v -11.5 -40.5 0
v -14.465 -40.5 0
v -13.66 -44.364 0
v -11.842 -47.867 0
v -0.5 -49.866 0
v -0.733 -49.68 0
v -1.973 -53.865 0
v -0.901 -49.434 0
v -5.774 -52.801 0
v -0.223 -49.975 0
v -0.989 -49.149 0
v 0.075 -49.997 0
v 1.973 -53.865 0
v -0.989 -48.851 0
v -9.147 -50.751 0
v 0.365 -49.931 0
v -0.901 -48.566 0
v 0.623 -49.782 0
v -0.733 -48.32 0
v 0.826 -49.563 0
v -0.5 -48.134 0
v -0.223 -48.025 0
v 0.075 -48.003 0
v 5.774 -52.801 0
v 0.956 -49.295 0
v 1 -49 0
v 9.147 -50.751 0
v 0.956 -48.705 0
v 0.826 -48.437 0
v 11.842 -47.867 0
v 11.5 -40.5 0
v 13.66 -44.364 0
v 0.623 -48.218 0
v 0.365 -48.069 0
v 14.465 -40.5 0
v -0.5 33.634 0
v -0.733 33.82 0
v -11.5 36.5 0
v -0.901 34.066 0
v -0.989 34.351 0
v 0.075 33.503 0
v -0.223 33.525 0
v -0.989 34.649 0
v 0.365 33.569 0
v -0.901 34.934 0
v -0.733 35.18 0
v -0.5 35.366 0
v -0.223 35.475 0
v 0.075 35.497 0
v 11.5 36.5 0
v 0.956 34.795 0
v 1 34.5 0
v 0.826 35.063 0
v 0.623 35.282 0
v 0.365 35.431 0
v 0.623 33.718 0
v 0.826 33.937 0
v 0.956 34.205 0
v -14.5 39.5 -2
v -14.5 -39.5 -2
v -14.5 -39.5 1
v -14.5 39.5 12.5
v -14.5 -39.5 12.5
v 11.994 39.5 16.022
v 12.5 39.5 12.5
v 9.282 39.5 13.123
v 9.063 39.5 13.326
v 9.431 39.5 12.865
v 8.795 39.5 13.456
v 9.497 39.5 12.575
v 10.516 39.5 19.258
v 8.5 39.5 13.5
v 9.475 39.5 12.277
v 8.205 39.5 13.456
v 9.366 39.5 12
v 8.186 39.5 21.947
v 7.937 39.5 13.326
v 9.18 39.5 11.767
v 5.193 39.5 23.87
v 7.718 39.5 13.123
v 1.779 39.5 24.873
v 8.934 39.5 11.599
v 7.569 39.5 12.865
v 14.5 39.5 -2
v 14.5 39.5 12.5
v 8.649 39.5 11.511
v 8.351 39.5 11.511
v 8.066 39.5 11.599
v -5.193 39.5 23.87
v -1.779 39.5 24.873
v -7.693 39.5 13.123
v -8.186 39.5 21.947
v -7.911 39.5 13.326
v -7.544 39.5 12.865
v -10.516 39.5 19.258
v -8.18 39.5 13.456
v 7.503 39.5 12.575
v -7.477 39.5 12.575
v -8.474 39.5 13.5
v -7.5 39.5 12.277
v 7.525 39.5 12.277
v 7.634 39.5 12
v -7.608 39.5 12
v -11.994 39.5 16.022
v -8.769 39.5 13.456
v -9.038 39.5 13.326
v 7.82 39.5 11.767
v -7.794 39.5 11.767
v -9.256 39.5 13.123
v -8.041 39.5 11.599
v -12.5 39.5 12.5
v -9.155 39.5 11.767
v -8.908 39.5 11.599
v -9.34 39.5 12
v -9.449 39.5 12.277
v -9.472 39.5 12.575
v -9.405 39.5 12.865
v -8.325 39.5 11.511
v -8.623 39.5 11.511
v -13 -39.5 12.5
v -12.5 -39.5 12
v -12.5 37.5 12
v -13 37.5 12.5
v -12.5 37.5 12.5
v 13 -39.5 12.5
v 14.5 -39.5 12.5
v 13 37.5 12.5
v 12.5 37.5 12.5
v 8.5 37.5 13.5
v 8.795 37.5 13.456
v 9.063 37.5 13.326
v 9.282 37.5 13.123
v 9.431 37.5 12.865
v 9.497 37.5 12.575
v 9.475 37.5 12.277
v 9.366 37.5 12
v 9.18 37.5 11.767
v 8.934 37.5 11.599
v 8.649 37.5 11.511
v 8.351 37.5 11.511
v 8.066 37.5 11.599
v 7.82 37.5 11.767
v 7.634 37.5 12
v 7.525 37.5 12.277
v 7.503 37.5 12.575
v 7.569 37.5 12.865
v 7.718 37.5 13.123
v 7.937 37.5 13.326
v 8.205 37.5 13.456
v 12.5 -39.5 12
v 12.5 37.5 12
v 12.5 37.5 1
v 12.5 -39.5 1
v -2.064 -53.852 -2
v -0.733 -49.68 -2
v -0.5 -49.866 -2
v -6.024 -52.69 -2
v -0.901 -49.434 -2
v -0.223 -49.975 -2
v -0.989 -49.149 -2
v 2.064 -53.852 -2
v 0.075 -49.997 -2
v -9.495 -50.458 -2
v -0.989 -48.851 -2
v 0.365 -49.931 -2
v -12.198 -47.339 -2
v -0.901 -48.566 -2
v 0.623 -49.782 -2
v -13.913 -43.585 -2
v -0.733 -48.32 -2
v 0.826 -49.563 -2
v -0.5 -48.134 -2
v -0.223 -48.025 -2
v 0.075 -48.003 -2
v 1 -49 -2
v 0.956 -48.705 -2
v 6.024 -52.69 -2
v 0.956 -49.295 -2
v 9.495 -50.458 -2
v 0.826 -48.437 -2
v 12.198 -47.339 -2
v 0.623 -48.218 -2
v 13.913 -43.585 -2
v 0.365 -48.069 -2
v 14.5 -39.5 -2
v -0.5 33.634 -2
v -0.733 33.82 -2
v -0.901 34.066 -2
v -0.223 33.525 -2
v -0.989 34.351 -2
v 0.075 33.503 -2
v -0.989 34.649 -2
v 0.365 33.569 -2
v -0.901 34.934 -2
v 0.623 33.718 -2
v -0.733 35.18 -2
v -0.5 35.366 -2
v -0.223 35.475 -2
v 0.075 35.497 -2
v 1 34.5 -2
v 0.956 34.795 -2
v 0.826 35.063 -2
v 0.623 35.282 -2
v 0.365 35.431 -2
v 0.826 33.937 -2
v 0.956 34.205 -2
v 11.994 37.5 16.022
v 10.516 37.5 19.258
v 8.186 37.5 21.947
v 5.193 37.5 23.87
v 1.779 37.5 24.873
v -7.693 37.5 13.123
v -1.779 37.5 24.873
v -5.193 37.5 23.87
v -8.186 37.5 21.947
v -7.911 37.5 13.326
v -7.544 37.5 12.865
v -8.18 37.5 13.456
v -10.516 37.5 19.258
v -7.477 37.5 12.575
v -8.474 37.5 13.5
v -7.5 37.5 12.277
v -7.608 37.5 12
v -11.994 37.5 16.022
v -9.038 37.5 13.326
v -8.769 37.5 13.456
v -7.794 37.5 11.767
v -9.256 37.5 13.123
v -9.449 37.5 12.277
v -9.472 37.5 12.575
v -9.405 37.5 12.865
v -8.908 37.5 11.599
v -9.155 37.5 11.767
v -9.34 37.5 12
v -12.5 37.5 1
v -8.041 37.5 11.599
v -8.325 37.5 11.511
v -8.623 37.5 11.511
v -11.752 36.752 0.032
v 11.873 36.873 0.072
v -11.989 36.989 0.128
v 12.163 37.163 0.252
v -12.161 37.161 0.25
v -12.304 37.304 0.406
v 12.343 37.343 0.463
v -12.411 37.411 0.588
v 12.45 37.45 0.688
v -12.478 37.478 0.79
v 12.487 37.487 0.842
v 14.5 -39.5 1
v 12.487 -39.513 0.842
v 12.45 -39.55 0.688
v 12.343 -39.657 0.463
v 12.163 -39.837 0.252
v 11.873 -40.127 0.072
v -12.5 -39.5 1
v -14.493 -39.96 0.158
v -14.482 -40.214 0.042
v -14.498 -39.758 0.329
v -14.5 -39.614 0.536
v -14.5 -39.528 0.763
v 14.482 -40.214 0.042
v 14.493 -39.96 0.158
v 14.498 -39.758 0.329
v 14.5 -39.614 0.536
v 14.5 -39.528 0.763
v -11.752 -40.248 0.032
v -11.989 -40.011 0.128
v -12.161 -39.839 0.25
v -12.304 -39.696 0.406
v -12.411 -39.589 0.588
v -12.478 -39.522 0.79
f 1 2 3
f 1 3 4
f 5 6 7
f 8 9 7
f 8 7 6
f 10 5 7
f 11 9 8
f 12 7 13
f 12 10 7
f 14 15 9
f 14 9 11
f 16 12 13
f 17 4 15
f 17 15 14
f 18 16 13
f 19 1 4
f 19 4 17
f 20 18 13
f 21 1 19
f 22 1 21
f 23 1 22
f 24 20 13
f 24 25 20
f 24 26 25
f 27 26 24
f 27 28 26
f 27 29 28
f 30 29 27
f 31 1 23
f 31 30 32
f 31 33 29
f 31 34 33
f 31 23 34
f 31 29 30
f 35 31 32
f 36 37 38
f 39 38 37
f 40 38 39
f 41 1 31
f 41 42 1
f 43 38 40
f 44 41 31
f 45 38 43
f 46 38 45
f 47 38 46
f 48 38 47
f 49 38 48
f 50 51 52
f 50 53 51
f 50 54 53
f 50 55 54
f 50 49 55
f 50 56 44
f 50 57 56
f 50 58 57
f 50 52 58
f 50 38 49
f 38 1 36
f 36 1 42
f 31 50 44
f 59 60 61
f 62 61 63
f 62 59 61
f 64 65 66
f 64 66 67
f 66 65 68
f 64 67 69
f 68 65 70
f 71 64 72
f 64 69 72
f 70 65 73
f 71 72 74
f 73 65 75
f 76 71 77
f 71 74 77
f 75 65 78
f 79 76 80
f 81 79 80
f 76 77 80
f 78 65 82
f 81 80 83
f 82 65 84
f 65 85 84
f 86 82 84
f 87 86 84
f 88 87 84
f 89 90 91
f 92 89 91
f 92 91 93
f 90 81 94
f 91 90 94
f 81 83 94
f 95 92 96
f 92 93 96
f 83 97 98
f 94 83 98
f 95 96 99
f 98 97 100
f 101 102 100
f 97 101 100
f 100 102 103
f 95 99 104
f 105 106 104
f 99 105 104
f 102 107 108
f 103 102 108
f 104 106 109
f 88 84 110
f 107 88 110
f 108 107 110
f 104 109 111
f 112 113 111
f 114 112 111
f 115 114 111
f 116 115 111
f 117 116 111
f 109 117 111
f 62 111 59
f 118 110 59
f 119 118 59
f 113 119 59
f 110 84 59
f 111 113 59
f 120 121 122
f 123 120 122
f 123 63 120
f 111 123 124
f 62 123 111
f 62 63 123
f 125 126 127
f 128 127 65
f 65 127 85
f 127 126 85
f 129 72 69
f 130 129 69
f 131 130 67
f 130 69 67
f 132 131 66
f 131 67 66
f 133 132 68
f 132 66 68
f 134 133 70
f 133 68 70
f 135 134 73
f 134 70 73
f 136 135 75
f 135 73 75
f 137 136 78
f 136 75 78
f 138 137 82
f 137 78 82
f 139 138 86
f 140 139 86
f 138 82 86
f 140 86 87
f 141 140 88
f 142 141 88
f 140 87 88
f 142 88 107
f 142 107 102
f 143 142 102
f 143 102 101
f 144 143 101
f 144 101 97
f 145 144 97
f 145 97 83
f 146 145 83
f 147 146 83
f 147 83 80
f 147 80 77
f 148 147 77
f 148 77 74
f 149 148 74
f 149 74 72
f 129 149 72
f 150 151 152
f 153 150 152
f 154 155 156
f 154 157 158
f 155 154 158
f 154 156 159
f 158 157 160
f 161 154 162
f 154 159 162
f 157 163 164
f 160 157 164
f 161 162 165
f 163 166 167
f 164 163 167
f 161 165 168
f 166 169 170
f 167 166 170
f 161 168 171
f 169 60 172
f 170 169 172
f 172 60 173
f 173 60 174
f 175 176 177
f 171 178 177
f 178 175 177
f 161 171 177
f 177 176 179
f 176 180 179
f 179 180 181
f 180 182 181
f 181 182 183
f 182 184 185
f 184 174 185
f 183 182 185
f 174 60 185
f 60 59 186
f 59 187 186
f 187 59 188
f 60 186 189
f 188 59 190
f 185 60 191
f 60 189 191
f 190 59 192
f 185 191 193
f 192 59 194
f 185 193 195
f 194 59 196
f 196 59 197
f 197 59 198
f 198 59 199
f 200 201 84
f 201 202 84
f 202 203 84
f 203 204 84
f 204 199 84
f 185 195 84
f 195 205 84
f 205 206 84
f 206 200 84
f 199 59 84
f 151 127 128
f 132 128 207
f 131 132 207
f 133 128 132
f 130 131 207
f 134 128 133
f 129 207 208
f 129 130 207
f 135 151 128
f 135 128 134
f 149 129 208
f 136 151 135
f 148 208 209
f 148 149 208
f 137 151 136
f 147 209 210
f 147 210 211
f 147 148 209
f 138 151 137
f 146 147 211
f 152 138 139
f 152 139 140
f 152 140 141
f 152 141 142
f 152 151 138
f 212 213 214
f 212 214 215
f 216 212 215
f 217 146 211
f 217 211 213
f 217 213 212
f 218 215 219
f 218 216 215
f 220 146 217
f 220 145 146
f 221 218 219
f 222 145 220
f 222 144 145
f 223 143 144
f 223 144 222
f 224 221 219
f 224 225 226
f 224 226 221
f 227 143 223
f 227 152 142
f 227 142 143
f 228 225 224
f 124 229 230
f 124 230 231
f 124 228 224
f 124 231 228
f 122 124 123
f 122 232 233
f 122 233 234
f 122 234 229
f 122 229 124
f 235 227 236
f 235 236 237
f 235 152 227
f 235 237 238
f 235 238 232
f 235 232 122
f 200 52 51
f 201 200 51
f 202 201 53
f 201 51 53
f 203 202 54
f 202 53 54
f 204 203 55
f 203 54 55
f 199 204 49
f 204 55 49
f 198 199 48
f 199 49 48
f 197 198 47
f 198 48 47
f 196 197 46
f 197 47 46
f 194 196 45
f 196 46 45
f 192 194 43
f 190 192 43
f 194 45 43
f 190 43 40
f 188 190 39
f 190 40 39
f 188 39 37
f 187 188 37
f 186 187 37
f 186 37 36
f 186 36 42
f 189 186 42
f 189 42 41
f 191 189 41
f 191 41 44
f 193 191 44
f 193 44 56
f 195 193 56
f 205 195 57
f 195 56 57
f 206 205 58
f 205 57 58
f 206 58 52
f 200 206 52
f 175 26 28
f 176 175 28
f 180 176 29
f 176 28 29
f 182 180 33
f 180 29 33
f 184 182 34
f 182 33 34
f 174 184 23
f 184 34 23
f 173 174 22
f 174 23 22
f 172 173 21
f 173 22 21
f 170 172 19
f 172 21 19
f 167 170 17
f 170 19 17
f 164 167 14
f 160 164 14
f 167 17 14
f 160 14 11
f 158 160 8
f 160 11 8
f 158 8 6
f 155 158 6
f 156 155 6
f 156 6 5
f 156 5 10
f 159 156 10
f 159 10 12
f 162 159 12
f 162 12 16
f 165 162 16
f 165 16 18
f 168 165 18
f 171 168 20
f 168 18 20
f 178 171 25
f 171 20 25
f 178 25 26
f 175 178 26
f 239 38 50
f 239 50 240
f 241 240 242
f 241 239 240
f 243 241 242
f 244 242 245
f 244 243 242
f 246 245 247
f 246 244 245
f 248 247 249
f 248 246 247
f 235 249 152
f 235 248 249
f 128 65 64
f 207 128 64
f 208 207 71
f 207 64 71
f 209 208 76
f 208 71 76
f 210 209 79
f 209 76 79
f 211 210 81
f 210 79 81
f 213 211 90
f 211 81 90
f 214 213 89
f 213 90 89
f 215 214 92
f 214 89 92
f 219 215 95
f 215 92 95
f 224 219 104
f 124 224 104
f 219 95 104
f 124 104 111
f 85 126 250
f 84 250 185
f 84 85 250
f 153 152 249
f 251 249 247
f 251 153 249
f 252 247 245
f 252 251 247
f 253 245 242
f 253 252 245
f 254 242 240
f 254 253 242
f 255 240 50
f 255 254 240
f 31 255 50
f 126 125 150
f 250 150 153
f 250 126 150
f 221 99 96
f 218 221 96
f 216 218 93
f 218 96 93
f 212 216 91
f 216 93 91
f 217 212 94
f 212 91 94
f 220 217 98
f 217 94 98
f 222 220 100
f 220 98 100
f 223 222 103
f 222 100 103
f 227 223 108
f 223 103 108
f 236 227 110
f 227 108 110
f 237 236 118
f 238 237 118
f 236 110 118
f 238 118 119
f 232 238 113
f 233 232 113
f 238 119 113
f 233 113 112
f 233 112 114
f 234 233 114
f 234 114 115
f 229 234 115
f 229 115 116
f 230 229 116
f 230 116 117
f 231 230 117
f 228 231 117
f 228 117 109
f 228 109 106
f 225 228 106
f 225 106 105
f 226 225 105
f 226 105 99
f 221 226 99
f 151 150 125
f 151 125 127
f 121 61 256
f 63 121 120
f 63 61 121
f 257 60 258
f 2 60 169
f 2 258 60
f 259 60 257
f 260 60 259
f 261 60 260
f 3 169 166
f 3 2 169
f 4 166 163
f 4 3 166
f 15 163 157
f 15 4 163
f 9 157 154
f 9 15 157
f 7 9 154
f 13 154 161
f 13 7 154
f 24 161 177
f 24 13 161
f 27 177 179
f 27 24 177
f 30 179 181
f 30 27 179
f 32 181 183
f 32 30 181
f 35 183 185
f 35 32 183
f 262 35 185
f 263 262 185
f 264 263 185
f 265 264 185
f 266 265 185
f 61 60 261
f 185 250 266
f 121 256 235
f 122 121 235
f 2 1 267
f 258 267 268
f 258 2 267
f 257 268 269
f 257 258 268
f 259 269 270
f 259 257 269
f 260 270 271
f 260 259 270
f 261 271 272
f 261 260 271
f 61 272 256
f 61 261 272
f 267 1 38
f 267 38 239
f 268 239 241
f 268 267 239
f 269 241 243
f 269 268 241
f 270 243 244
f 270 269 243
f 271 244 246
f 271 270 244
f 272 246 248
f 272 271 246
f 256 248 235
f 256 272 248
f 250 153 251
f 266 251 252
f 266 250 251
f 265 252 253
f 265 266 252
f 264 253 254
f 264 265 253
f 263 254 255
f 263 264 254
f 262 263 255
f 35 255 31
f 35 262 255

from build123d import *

# Parameters (mm, degrees)
ESQUISSE1_R             = 1
BOSS_EXTRU_2_DEPTH      = 2
ESQUISSE4_W             = 12.5
ESQUISSE4_H             = 79
BOSS_EXTRU_3_DEPTH      = 2
ESQUISSE6_W             = 12.5
ESQUISSE6_H             = 79
BOSS_EXTRU_4_DEPTH      = 2
BOSS_EXTRU_7_DEPTH      = 2
ESQUISSE14_R            = 1
ENL_V_MAT_EXTRU_4_DEPTH = 98.864702523
CHANFREIN3_SIZE         = 0.5
CONG_1_R                = 1


with BuildPart() as part:
    # Esquisse1 → Boss.-Extru.2 (new body)
    with BuildSketch(Plane.XY):
        with BuildLine():
            Line((14.5, -39.5), (14.5, 39.5))
            Line((14.5, 39.5), (-14.5, 39.5))
            Line((-14.5, 39.5), (-14.5, -39.5))
            ThreePointArc((-14.5, -39.5), (0, -54), (14.5, -39.5))
        make_face()
        with Locations((0, 34.5)):
            Circle(ESQUISSE1_R, mode=Mode.SUBTRACT)
        with Locations((0, -49)):
            Circle(ESQUISSE1_R, mode=Mode.SUBTRACT)
    extrude(amount=-BOSS_EXTRU_2_DEPTH)

    # Esquisse4 → Boss.-Extru.3 (add)
    with BuildSketch(Plane.ZY.offset(14.5)):
        with Locations((6.25, 0)):
            Rectangle(ESQUISSE4_W, ESQUISSE4_H)
    extrude(amount=-BOSS_EXTRU_3_DEPTH)

    # Esquisse6 → Boss.-Extru.4 (add)
    with BuildSketch(Plane(origin=(14.5, 0, 0), x_dir=(0, 0, -1), z_dir=(1, 0, 0))):
        with Locations((-6.25, 0)):
            Rectangle(ESQUISSE6_W, ESQUISSE6_H)
    extrude(amount=-BOSS_EXTRU_4_DEPTH)

    # Esquisse11 → Boss.-Extru.7 (add)
    with BuildSketch(Plane(origin=(0, 39.5, 0), x_dir=(1, 0, 0), z_dir=(0, 1, 0))):
        with BuildLine():
            Line((-12.5, 0), (12.5, 0))
            Line((12.5, 0), (12.5, -12.5))
            ThreePointArc((12.5, -12.5), (0, -25), (-12.5, -12.5))
            Line((-12.5, -12.5), (-12.5, 0))
        make_face()
    extrude(amount=-BOSS_EXTRU_7_DEPTH)

    # Esquisse14 → Enlèv. mat.-Extru.4 (cut, through all)
    with BuildSketch(Plane(origin=(0, 39.5, 0), x_dir=(1, 0, 0), z_dir=(0, 1, 0))):
        with Locations(Location((-8.474453363, -12.5, 0), (0, 0, 270))):
            Circle(ESQUISSE14_R)
        with Locations(Location((8.5, -12.5, 0), (0, 0, 270))):
            Circle(ESQUISSE14_R)
    extrude(amount=-ENL_V_MAT_EXTRU_4_DEPTH, mode=Mode.SUBTRACT)

    # Chanfrein3
    chanfrein3_edges = [part.edges().sort_by_distance(p)[0] for p in [
        (-12.5, -1, 12.5),
        (12.5, -1, 12.5),
    ]]
    chamfer(chanfrein3_edges, length=CHANFREIN3_SIZE)

    # Congé1
    # the kernel refuses this fillet: 1 mm, written as the material it adds along each edge
    with BuildSketch(Plane(origin=(-14.5, -39.5, 0), x_dir=(0, -1, 0), z_dir=(1, 0, 0))) as cong_1_piece_1_section:
        with BuildLine():
            CenterArc((CONG_1_R, -CONG_1_R), CONG_1_R, 90, 90)
            Line((0, -CONG_1_R), (-CONG_1_R * 0.02, -CONG_1_R))
            Line((-CONG_1_R * 0.02, -CONG_1_R), (-CONG_1_R * 0.02, CONG_1_R * 0.02))
            Line((-CONG_1_R * 0.02, CONG_1_R * 0.02), (CONG_1_R, CONG_1_R * 0.02))
            Line((CONG_1_R, CONG_1_R * 0.02), (CONG_1_R, 0))
        make_face()
    cong_1_piece_1 = extrude(amount=2, mode=Mode.PRIVATE)
    cong_1_piece_1 = cong_1_piece_1 & Plane(origin=(0, -39.5, 0.22667443), x_dir=(-1, 0, 0), z_dir=(0, 0, 1)) * Cylinder(14.5, 8, mode=Mode.PRIVATE)
    add(cong_1_piece_1)
    with BuildSketch(Plane(origin=(12.5, -39.5, 0), x_dir=(0, 0, 1), z_dir=(0, 1, 0)), Plane(origin=(-12.5, -39.5, 0), x_dir=(1, 0, 0), z_dir=(0, 1, 0))) as cong_1_piece_2:
        with BuildLine():
            CenterArc((CONG_1_R, -CONG_1_R), CONG_1_R, 90, 90)
            Line((0, -CONG_1_R), (-CONG_1_R * 0.02, -CONG_1_R))
            Line((-CONG_1_R * 0.02, -CONG_1_R), (-CONG_1_R * 0.02, CONG_1_R * 0.02))
            Line((-CONG_1_R * 0.02, CONG_1_R * 0.02), (CONG_1_R, CONG_1_R * 0.02))
            Line((CONG_1_R, CONG_1_R * 0.02), (CONG_1_R, 0))
        make_face()
    extrude(amount=77)
    with BuildSketch(Plane(origin=(14.5, -39.5, 0), x_dir=(0, 0, 1), z_dir=(-1, 0, 0))) as cong_1_piece_3_section:
        with BuildLine():
            CenterArc((CONG_1_R, -CONG_1_R), CONG_1_R, 90, 90)
            Line((0, -CONG_1_R), (-CONG_1_R * 0.02, -CONG_1_R))
            Line((-CONG_1_R * 0.02, -CONG_1_R), (-CONG_1_R * 0.02, CONG_1_R * 0.02))
            Line((-CONG_1_R * 0.02, CONG_1_R * 0.02), (CONG_1_R, CONG_1_R * 0.02))
            Line((CONG_1_R, CONG_1_R * 0.02), (CONG_1_R, 0))
        make_face()
    cong_1_piece_3 = extrude(amount=2, mode=Mode.PRIVATE)
    cong_1_piece_3 = cong_1_piece_3 & Plane(origin=(0, -39.5, 0.226674419), x_dir=(-1, 0, 0), z_dir=(0, 0, 1)) * Cylinder(14.5, 8, mode=Mode.PRIVATE)
    add(cong_1_piece_3)
    with BuildSketch(Plane(origin=(-12.5, 37.5, 0), x_dir=(0, 0, 1), z_dir=(1, 0, 0))) as cong_1_piece_4:
        with BuildLine():
            CenterArc((CONG_1_R, CONG_1_R), CONG_1_R, 180, 90)
            Line((0, CONG_1_R), (-CONG_1_R * 0.02, CONG_1_R))
            Line((-CONG_1_R * 0.02, CONG_1_R), (-CONG_1_R * 0.02, -CONG_1_R * 0.02))
            Line((-CONG_1_R * 0.02, -CONG_1_R * 0.02), (CONG_1_R, -CONG_1_R * 0.02))
            Line((CONG_1_R, -CONG_1_R * 0.02), (CONG_1_R, 0))
        make_face()
    extrude(amount=25)
    with BuildSketch(Plane(origin=(-14.5, -39.5, 0), x_dir=(0, -1, 0), z_dir=(1, 0, 0))) as cong_1_piece_5a_section:
        with BuildLine():
            CenterArc((CONG_1_R, -CONG_1_R), CONG_1_R, 90, 90)
            Line((0, -CONG_1_R), (-CONG_1_R * 0.02, -CONG_1_R))
            Line((-CONG_1_R * 0.02, -CONG_1_R), (-CONG_1_R * 0.02, CONG_1_R * 0.02))
            Line((-CONG_1_R * 0.02, CONG_1_R * 0.02), (CONG_1_R, CONG_1_R * 0.02))
            Line((CONG_1_R, CONG_1_R * 0.02), (CONG_1_R, 0))
        make_face()
    cong_1_piece_5a = extrude(amount=4.5, mode=Mode.PRIVATE)
    cong_1_piece_5a = split(cong_1_piece_5a, bisect_by=Plane(origin=(-12.5, -39.726395114, 0.226395114), z_dir=(1, 0, 0)), keep=Keep.TOP, mode=Mode.PRIVATE)
    with BuildSketch(Plane(origin=(-12.5, -42, 0), x_dir=(1, 0, 0), z_dir=(0, 1, 0))) as cong_1_piece_5b_section:
        with BuildLine():
            CenterArc((CONG_1_R, -CONG_1_R), CONG_1_R, 90, 90)
            Line((0, -CONG_1_R), (-CONG_1_R * 0.02, -CONG_1_R))
            Line((-CONG_1_R * 0.02, -CONG_1_R), (-CONG_1_R * 0.02, CONG_1_R * 0.02))
            Line((-CONG_1_R * 0.02, CONG_1_R * 0.02), (CONG_1_R, CONG_1_R * 0.02))
            Line((CONG_1_R, CONG_1_R * 0.02), (CONG_1_R, 0))
        make_face()
    cong_1_piece_5b = extrude(amount=79.5, mode=Mode.PRIVATE)
    cong_1_piece_5b = split(cong_1_piece_5b, bisect_by=Plane(origin=(-12.273604886, -39.5, 0.226395114), z_dir=(0, -1, 0)), keep=Keep.TOP, mode=Mode.PRIVATE)
    cong_1_piece_5 = cong_1_piece_5a & cong_1_piece_5b
    add(cong_1_piece_5)
    with BuildSketch(Plane(origin=(14.5, -39.5, 0), x_dir=(0, 0, 1), z_dir=(-1, 0, 0))) as cong_1_piece_6a_section:
        with BuildLine():
            CenterArc((CONG_1_R, -CONG_1_R), CONG_1_R, 90, 90)
            Line((0, -CONG_1_R), (-CONG_1_R * 0.02, -CONG_1_R))
            Line((-CONG_1_R * 0.02, -CONG_1_R), (-CONG_1_R * 0.02, CONG_1_R * 0.02))
            Line((-CONG_1_R * 0.02, CONG_1_R * 0.02), (CONG_1_R, CONG_1_R * 0.02))
            Line((CONG_1_R, CONG_1_R * 0.02), (CONG_1_R, 0))
        make_face()
    cong_1_piece_6a = extrude(amount=4.5, mode=Mode.PRIVATE)
    cong_1_piece_6a = split(cong_1_piece_6a, bisect_by=Plane(origin=(12.5, -39.726395114, 0.226395114), z_dir=(-1, 0, 0)), keep=Keep.TOP, mode=Mode.PRIVATE)
    with BuildSketch(Plane(origin=(12.5, -42, 0), x_dir=(0, 0, 1), z_dir=(0, 1, 0))) as cong_1_piece_6b_section:
        with BuildLine():
            CenterArc((CONG_1_R, -CONG_1_R), CONG_1_R, 90, 90)
            Line((0, -CONG_1_R), (-CONG_1_R * 0.02, -CONG_1_R))
            Line((-CONG_1_R * 0.02, -CONG_1_R), (-CONG_1_R * 0.02, CONG_1_R * 0.02))
            Line((-CONG_1_R * 0.02, CONG_1_R * 0.02), (CONG_1_R, CONG_1_R * 0.02))
            Line((CONG_1_R, CONG_1_R * 0.02), (CONG_1_R, 0))
        make_face()
    cong_1_piece_6b = extrude(amount=79.5, mode=Mode.PRIVATE)
    cong_1_piece_6b = split(cong_1_piece_6b, bisect_by=Plane(origin=(12.273604886, -39.5, 0.226395114), z_dir=(0, -1, 0)), keep=Keep.TOP, mode=Mode.PRIVATE)
    cong_1_piece_6 = cong_1_piece_6a & cong_1_piece_6b
    add(cong_1_piece_6)
    with BuildSketch(Plane(origin=(-12.5, 37.5, 0), x_dir=(0, 0, 1), z_dir=(1, 0, 0))) as cong_1_piece_7a_section:
        with BuildLine():
            CenterArc((CONG_1_R, CONG_1_R), CONG_1_R, 180, 90)
            Line((0, CONG_1_R), (-CONG_1_R * 0.02, CONG_1_R))
            Line((-CONG_1_R * 0.02, CONG_1_R), (-CONG_1_R * 0.02, -CONG_1_R * 0.02))
            Line((-CONG_1_R * 0.02, -CONG_1_R * 0.02), (CONG_1_R, -CONG_1_R * 0.02))
            Line((CONG_1_R, -CONG_1_R * 0.02), (CONG_1_R, 0))
        make_face()
    cong_1_piece_7a = extrude(amount=27.5, mode=Mode.PRIVATE)
    cong_1_piece_7a = split(cong_1_piece_7a, bisect_by=Plane(origin=(12.5, 37.273604886, 0.226395114), z_dir=(1, 0, 0)), keep=Keep.TOP, mode=Mode.PRIVATE)
    with BuildSketch(Plane(origin=(12.5, -39.5, 0), x_dir=(0, 0, 1), z_dir=(0, 1, 0))) as cong_1_piece_7b_section:
        with BuildLine():
            CenterArc((CONG_1_R, -CONG_1_R), CONG_1_R, 90, 90)
            Line((0, -CONG_1_R), (-CONG_1_R * 0.02, -CONG_1_R))
            Line((-CONG_1_R * 0.02, -CONG_1_R), (-CONG_1_R * 0.02, CONG_1_R * 0.02))
            Line((-CONG_1_R * 0.02, CONG_1_R * 0.02), (CONG_1_R, CONG_1_R * 0.02))
            Line((CONG_1_R, CONG_1_R * 0.02), (CONG_1_R, 0))
        make_face()
    cong_1_piece_7b = extrude(amount=79.5, mode=Mode.PRIVATE)
    cong_1_piece_7b = split(cong_1_piece_7b, bisect_by=Plane(origin=(12.273604886, 37.5, 0.226395114), z_dir=(0, 1, 0)), keep=Keep.TOP, mode=Mode.PRIVATE)
    cong_1_piece_7 = cong_1_piece_7a & cong_1_piece_7b
    add(cong_1_piece_7)
    with BuildSketch(Plane(origin=(-15, 37.5, 0), x_dir=(0, 0, 1), z_dir=(1, 0, 0))) as cong_1_piece_8a_section:
        with BuildLine():
            CenterArc((CONG_1_R, CONG_1_R), CONG_1_R, 180, 90)
            Line((0, CONG_1_R), (-CONG_1_R * 0.02, CONG_1_R))
            Line((-CONG_1_R * 0.02, CONG_1_R), (-CONG_1_R * 0.02, -CONG_1_R * 0.02))
            Line((-CONG_1_R * 0.02, -CONG_1_R * 0.02), (CONG_1_R, -CONG_1_R * 0.02))
            Line((CONG_1_R, -CONG_1_R * 0.02), (CONG_1_R, 0))
        make_face()
    cong_1_piece_8a = extrude(amount=27.5, mode=Mode.PRIVATE)
    cong_1_piece_8a = split(cong_1_piece_8a, bisect_by=Plane(origin=(-12.5, 37.273604886, 0.226395114), z_dir=(-1, 0, 0)), keep=Keep.TOP, mode=Mode.PRIVATE)
    with BuildSketch(Plane(origin=(-12.5, -39.5, 0), x_dir=(1, 0, 0), z_dir=(0, 1, 0))) as cong_1_piece_8b_section:
        with BuildLine():
            CenterArc((CONG_1_R, -CONG_1_R), CONG_1_R, 90, 90)
            Line((0, -CONG_1_R), (-CONG_1_R * 0.02, -CONG_1_R))
            Line((-CONG_1_R * 0.02, -CONG_1_R), (-CONG_1_R * 0.02, CONG_1_R * 0.02))
            Line((-CONG_1_R * 0.02, CONG_1_R * 0.02), (CONG_1_R, CONG_1_R * 0.02))
            Line((CONG_1_R, CONG_1_R * 0.02), (CONG_1_R, 0))
        make_face()
    cong_1_piece_8b = extrude(amount=79.5, mode=Mode.PRIVATE)
    cong_1_piece_8b = split(cong_1_piece_8b, bisect_by=Plane(origin=(-12.273604886, 37.5, 0.226395114), z_dir=(0, 1, 0)), keep=Keep.TOP, mode=Mode.PRIVATE)
    cong_1_piece_8 = cong_1_piece_8a & cong_1_piece_8b
    add(cong_1_piece_8)


solid = part.part
